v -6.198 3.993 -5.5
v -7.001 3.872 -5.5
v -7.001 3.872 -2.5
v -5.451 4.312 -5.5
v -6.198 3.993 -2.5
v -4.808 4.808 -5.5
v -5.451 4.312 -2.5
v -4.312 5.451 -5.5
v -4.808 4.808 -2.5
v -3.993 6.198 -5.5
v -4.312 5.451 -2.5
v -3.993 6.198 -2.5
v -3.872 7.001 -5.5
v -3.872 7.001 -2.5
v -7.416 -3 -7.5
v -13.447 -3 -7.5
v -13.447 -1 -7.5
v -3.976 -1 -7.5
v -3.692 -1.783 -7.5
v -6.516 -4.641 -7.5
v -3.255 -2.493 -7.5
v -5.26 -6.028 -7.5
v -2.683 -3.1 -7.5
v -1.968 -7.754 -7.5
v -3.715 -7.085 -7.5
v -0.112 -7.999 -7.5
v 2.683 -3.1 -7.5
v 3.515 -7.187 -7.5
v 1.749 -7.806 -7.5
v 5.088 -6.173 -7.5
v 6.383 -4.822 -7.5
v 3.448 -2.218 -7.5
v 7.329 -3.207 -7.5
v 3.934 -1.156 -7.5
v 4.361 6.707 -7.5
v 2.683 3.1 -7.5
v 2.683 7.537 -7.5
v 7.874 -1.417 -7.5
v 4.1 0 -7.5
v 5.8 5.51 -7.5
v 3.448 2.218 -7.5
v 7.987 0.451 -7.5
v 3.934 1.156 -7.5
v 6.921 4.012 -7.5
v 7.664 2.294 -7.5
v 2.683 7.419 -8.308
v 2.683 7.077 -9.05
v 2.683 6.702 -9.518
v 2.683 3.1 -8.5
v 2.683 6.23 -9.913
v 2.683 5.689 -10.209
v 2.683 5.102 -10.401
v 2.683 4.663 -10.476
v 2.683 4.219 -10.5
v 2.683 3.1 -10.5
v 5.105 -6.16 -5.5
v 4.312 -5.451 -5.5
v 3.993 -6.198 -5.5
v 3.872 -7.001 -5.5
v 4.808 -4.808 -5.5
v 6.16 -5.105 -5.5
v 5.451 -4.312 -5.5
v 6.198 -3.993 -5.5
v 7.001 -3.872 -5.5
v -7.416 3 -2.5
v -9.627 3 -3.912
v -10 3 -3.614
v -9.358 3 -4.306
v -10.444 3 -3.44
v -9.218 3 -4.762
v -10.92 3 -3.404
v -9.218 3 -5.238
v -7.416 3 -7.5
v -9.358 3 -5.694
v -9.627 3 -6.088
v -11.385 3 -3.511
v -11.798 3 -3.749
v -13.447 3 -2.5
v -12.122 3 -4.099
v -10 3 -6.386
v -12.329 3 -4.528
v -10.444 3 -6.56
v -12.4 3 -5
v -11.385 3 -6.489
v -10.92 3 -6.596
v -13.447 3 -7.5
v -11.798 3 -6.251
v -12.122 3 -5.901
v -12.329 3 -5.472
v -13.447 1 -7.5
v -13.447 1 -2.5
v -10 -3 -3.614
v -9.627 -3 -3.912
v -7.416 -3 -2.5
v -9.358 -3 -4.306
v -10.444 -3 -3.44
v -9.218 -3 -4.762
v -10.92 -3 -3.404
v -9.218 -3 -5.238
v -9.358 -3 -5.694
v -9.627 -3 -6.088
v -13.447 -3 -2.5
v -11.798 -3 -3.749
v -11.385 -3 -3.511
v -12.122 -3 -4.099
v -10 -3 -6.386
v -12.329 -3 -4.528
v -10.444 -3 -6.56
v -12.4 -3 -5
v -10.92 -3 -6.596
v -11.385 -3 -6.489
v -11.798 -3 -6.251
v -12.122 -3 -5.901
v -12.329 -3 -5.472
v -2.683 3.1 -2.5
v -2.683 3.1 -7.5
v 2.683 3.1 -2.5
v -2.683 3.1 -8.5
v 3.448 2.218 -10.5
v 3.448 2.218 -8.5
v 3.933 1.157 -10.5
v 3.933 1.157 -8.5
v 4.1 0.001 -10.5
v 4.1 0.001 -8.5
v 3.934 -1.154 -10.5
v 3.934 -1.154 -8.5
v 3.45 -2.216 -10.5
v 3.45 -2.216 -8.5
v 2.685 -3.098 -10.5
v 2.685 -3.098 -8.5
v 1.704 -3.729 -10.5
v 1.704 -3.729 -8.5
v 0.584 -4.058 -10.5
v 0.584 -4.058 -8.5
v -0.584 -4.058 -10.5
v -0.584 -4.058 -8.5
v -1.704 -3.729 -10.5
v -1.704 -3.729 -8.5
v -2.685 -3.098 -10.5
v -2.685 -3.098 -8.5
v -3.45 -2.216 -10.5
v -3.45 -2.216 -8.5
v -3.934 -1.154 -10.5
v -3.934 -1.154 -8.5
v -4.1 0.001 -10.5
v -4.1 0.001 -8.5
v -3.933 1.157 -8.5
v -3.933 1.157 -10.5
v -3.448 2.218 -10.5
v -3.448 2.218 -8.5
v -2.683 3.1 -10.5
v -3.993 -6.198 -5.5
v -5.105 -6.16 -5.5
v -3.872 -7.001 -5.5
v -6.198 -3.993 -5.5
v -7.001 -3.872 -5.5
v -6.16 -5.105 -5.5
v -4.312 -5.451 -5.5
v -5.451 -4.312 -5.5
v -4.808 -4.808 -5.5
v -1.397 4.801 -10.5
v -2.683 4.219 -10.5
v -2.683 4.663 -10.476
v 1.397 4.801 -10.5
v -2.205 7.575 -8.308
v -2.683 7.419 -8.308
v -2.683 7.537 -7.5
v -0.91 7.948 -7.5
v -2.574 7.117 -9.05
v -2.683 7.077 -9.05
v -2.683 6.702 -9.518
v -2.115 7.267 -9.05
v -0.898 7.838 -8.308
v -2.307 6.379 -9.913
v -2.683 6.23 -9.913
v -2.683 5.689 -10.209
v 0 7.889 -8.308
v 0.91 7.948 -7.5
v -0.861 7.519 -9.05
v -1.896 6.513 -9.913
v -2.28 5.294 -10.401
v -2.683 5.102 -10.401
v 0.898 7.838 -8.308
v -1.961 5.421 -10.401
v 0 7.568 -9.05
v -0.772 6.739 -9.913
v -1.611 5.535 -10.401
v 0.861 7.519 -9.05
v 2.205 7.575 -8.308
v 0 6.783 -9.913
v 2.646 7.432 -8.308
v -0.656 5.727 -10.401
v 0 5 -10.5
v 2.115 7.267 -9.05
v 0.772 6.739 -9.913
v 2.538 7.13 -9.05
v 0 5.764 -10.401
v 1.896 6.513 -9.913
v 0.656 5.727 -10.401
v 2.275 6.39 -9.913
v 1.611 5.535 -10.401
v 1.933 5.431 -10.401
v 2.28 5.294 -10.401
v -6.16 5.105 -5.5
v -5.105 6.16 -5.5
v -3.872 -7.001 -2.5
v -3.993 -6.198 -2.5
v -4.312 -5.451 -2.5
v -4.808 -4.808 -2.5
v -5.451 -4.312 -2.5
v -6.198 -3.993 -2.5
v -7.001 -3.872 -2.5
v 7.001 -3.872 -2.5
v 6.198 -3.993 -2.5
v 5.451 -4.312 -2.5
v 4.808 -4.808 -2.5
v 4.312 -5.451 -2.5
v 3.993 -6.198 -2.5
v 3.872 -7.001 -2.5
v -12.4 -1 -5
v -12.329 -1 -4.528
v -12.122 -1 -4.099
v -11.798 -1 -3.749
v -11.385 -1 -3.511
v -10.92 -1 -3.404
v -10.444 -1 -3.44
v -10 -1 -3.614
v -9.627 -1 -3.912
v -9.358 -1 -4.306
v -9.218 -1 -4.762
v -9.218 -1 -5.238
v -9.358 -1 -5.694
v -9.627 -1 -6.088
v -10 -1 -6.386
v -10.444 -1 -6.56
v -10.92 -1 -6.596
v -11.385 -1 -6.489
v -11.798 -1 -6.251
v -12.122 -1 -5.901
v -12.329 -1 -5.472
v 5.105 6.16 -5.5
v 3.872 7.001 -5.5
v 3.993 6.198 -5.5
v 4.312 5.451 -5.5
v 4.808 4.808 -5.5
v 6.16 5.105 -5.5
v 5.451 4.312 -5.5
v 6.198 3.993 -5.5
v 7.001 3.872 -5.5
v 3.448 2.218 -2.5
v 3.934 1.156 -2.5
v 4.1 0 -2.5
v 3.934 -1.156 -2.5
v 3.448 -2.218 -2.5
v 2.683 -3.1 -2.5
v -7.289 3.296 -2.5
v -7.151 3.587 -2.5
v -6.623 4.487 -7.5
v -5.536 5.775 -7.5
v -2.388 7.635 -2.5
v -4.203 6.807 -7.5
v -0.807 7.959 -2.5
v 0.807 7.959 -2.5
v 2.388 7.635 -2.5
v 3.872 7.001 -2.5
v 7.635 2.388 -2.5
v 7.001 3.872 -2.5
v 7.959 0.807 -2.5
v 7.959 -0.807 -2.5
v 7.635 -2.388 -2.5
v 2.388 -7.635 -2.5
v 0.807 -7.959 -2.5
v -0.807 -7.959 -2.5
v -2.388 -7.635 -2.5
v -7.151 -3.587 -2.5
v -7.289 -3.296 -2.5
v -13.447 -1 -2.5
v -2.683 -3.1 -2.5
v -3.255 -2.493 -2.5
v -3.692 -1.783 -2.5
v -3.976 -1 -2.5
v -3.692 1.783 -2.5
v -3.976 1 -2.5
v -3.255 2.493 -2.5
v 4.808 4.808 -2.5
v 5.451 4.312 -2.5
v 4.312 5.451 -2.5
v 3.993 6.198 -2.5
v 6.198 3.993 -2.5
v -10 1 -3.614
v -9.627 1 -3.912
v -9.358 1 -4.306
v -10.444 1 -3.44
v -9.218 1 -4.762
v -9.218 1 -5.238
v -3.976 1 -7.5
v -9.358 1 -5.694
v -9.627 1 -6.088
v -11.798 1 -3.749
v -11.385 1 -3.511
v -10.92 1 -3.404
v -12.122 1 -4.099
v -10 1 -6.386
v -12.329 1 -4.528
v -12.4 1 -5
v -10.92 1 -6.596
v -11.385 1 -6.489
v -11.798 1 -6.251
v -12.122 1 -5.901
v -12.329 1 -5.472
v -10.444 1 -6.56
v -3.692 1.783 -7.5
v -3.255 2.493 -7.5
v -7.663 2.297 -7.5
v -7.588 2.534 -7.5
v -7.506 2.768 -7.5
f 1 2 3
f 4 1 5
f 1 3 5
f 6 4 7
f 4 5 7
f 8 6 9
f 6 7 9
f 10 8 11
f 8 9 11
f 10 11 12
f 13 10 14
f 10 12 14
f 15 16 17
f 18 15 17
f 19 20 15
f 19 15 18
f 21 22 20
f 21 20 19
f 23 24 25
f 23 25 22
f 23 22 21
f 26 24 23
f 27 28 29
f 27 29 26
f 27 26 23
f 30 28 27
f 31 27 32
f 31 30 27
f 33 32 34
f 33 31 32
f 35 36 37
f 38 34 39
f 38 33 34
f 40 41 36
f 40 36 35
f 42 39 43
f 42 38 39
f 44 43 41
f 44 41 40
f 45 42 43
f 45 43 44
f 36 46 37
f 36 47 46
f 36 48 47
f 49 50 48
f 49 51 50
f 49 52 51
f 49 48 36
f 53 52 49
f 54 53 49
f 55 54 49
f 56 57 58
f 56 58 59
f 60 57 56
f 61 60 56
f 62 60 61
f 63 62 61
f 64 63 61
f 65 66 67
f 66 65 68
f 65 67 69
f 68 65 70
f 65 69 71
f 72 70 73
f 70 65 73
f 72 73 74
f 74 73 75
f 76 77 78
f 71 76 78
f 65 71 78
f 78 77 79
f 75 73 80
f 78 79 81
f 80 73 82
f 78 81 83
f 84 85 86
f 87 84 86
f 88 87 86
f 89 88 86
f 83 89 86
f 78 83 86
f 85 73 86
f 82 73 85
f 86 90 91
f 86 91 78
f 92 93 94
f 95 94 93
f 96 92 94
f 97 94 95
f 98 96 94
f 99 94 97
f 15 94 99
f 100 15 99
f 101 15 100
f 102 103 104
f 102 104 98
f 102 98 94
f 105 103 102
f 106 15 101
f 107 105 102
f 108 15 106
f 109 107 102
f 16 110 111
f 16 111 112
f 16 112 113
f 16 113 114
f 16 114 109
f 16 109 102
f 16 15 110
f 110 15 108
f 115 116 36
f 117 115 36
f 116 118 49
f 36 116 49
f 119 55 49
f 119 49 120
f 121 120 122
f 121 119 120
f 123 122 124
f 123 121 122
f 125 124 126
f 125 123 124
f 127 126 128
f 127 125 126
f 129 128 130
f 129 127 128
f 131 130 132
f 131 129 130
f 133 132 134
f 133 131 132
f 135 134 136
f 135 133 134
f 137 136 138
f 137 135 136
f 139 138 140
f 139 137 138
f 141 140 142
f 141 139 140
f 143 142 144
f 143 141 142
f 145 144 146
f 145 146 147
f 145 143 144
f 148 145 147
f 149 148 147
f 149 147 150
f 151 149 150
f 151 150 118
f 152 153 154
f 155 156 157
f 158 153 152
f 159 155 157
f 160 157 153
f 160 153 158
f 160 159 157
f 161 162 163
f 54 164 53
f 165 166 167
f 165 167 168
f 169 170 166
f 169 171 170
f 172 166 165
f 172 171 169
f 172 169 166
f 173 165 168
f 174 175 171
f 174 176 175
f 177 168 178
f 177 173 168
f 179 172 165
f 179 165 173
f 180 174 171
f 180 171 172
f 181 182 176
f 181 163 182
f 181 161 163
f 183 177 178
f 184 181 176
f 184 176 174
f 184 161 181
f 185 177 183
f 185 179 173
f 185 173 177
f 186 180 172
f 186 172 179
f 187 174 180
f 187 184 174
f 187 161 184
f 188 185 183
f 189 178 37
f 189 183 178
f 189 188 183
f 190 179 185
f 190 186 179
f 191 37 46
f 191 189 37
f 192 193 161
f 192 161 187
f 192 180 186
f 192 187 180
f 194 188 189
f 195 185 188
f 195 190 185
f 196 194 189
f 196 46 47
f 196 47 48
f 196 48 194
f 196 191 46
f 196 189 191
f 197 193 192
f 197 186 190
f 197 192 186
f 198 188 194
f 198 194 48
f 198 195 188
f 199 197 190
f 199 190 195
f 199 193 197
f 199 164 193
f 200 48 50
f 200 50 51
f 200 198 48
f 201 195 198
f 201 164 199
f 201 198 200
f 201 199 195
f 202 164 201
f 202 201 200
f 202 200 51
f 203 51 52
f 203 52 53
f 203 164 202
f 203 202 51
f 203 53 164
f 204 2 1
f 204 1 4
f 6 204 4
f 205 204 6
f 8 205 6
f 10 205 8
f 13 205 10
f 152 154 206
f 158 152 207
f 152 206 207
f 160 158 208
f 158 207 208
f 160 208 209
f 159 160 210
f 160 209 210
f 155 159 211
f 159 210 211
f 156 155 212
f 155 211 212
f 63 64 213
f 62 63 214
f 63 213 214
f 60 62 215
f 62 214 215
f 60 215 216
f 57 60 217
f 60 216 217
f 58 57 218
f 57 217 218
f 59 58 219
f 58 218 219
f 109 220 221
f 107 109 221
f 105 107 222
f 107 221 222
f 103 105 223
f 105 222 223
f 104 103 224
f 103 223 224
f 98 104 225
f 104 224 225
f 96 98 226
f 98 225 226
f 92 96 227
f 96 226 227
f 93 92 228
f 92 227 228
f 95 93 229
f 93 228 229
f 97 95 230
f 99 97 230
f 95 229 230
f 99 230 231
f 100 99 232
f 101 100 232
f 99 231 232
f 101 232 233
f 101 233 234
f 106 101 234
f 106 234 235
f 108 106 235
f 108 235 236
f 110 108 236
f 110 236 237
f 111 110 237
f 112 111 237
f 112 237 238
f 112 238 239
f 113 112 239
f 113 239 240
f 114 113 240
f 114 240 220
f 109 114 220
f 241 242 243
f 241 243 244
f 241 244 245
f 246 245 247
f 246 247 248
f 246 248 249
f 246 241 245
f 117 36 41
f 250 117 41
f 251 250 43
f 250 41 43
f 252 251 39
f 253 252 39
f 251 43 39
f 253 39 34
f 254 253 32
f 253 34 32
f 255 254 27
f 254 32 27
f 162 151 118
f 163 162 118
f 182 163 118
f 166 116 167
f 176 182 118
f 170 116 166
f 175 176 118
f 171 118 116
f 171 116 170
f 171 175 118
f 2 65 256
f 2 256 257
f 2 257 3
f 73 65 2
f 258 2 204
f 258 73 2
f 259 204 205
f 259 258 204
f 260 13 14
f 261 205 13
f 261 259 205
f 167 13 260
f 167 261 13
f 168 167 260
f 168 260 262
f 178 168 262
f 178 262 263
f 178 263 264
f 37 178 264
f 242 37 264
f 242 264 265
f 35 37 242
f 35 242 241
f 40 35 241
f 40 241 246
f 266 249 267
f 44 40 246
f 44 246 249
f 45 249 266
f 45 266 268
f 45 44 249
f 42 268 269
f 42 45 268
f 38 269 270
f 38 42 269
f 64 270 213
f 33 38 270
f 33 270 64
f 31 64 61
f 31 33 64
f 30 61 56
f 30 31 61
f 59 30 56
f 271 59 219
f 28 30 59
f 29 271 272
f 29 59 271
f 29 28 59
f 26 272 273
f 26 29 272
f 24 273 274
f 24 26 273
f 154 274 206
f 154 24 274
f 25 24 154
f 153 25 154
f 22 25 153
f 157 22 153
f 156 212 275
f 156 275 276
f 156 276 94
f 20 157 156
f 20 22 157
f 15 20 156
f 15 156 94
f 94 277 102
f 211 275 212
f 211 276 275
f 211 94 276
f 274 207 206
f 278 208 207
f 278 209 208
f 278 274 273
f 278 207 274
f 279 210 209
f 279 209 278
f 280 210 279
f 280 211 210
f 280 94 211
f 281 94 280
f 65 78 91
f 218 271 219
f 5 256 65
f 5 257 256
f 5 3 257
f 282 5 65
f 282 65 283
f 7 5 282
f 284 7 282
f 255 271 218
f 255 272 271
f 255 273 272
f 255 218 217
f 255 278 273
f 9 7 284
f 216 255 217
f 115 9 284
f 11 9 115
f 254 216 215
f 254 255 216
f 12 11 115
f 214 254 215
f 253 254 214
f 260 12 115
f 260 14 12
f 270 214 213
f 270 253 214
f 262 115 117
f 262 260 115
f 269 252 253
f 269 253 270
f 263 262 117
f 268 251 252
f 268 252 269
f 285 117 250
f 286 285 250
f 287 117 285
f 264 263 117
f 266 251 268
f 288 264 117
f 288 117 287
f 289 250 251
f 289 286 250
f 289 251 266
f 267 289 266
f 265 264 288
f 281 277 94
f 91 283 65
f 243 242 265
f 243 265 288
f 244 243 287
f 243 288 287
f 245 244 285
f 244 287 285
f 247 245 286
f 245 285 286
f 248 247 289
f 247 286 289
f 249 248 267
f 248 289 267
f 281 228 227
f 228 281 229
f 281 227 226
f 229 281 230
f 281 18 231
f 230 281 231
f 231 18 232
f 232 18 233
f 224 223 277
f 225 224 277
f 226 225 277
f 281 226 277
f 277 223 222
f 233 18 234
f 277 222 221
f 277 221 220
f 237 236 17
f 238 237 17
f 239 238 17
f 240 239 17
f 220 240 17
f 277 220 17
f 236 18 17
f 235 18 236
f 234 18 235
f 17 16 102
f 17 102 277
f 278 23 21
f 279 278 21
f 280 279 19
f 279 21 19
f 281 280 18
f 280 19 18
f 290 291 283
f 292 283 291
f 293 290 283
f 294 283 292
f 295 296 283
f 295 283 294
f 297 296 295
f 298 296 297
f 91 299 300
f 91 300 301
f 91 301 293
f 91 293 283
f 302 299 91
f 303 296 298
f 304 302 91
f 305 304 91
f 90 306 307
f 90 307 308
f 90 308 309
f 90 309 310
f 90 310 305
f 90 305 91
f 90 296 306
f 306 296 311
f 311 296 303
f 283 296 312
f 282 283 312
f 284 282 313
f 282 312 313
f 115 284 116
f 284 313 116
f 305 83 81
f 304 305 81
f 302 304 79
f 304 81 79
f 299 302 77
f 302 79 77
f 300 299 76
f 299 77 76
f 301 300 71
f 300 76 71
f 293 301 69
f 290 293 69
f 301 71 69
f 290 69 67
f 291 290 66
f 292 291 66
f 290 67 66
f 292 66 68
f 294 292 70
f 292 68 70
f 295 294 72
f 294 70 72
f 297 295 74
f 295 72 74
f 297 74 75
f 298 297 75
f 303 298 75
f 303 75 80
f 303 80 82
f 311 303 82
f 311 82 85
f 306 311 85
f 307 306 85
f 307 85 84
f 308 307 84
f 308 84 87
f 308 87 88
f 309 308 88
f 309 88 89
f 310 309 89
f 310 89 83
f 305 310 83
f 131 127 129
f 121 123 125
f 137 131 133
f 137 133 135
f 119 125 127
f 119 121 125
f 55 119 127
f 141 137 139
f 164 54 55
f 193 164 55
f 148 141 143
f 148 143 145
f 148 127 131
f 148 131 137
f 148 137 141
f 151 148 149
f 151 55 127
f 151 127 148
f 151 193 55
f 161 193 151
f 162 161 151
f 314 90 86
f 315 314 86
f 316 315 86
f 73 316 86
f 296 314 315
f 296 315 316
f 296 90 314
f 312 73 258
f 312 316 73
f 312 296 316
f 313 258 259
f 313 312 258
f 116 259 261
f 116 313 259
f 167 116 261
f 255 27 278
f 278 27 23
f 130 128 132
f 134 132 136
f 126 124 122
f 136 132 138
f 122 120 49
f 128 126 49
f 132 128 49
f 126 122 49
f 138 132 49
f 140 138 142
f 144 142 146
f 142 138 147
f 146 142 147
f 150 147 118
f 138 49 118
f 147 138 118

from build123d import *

# Parameters (mm, degrees)
SKETCH_1_R          = 14
SKETCH_1_R_2        = 1.5
EXTRUDE_1_DEPTH     = 2
CUT_EXTRUDE_1_DEPTH = 20.899748742
EXTRUDE_4_DEPTH     = 2.5
EXTRUDE_START       = 5
SKETCH_6_R          = 8
EXTRUDE_5_DEPTH     = 5
EXTRUDE_START_2     = 1
EXTRUDE_6_DEPTH     = 1
SKETCH_8_W          = 8
SKETCH_8_H          = 2
EXTRUDE_7_DEPTH     = 5
SKETCH_9_R          = 1.6
CUT_EXTRUDE_3_DEPTH = 24.606143268
EXTRUDE_START_3     = 2
EXTRUDE_8_DEPTH     = 2
SKETCH_11_W         = 12.041493288
SKETCH_11_H         = 2
CUT_EXTRUDE_4_DEPTH = 5
FILLET_2_R          = 3
CUT_EXTRUDE_START   = -4.5
SKETCH_12_R         = 14
CUT_EXTRUDE_5_DEPTH = 4.5
SKETCH_13_R         = 3.2
CUT_EXTRUDE_6_DEPTH = 3


with BuildPart() as part:
    # 草图1 → 凸台-拉伸1 (new body)
    with BuildSketch(Plane.XY):
        Circle(SKETCH_1_R)
        with Locations((-7.071067812, 7.071067812)):
            Circle(SKETCH_1_R_2, mode=Mode.SUBTRACT)
        with Locations((7.071067812, 7.071067812)):
            Circle(SKETCH_1_R_2, mode=Mode.SUBTRACT)
        with Locations((-7.071067812, -7.071067812)):
            Circle(SKETCH_1_R_2, mode=Mode.SUBTRACT)
        with Locations((7.071067812, -7.071067812)):
            Circle(SKETCH_1_R_2, mode=Mode.SUBTRACT)
    extrude(amount=EXTRUDE_1_DEPTH)

    # 草图2 → 切除-拉伸1 (cut, through all)
    with BuildSketch(Plane(origin=(0, 0, 0), x_dir=(-1, 0, 0), z_dir=(0, 0, -1))):
        with BuildLine():
            ThreePointArc((-2.683281573, 3.1), (-4.1, 0), (-2.683281573, -3.1))
            Line((-2.683281573, -3.1), (2.683281573, -3.1))
            ThreePointArc((2.683281573, -3.1), (4.1, 0), (2.683281573, 3.1))
            Line((2.683281573, 3.1), (-2.683281573, 3.1))
        make_face()
    extrude(amount=-CUT_EXTRUDE_1_DEPTH, mode=Mode.SUBTRACT)

    # 草图3 → 凸台-拉伸4 (add)
    with BuildSketch(Plane(origin=(0, 0, 0), x_dir=(-1, 0, 0), z_dir=(0, 0, -1))):
        Polygon((0, 3.1), (3.7, 3.1), (3.7, 7.1), (-3.7, 7.1), (-3.7, 3.1), align=None)
    extrude(amount=EXTRUDE_4_DEPTH)

    # 草图6 → 凸台-拉伸5 (add)
    with BuildSketch(Plane(origin=(0, 0, -2.5), x_dir=(-1, 0, 0), z_dir=(0, 0, -1)).offset(EXTRUDE_START)):
        Circle(SKETCH_6_R)
        with BuildLine():
            Line((-2.683281573, -3.1), (2.683281573, -3.1))
            ThreePointArc((2.683281573, -3.1), (4.1, 0), (2.683281573, 3.1))
            Line((2.683281573, 3.1), (-2.683281573, 3.1))
            ThreePointArc((-2.683281573, 3.1), (-4.1, 0), (-2.683281573, -3.1))
        make_face(mode=Mode.SUBTRACT)
    extrude(amount=-EXTRUDE_5_DEPTH)

    # 草图7 → 凸台-拉伸6 (add)
    with BuildSketch(Plane(origin=(0, 0, -7.5), x_dir=(-1, 0, 0), z_dir=(0, 0, -1)).offset(EXTRUDE_START_2)):
        with BuildLine():
            Line((-2.683281573, 3.1), (-2.683281573, 7.536577473))
            ThreePointArc((-2.683281573, 7.536577473), (0, 8), (2.683281573, 7.536577473))
            Line((2.683281573, 7.536577473), (2.683281573, 3.1))
            Line((2.683281573, 3.1), (-2.683281573, 3.1))
        make_face()
    extrude(amount=-EXTRUDE_6_DEPTH)

    # 草图8 → 凸台-拉伸7 (add)
    with BuildSketch(Plane(origin=(0, 0, -7.5), x_dir=(-1, 0, 0), z_dir=(0, 0, -1))):
        with Locations((9.447401339, 2)):
            Rectangle(SKETCH_8_W, SKETCH_8_H)
        with Locations((9.447401339, -2)):
            Rectangle(SKETCH_8_W, SKETCH_8_H)
    extrude(amount=-EXTRUDE_7_DEPTH)

    # 草图9 → 切除-拉伸3 (cut, through all)
    with BuildSketch(Plane(origin=(0, 3, 0), x_dir=(1, 0, 0), z_dir=(0, 1, 0))):
        with Locations((-10.8, 5)):
            Circle(SKETCH_9_R)
    extrude(amount=-CUT_EXTRUDE_3_DEPTH, mode=Mode.SUBTRACT)

    # 草图10 → 凸台-拉伸8 (add)
    with BuildSketch(Plane(origin=(0, 0, -8.5), x_dir=(-1, 0, 0), z_dir=(0, 0, -1)).offset(EXTRUDE_START_3)):
        with BuildLine():
            Line((-2.683281573, 7.536577473), (-2.683281573, 3.1))
            ThreePointArc((-2.683281573, 3.1), (0, -4.1), (2.683281573, 3.1))
            Line((2.683281573, 3.1), (2.683281573, 7.536577473))
            ThreePointArc((2.683281573, 7.536577473), (0, 8), (-2.683281573, 7.536577473))
        make_face()
    extrude(amount=-EXTRUDE_8_DEPTH)

    # 草图11 → 切除-拉伸4 (cut)
    with BuildSketch(Plane(origin=(0, 0, -7.5), x_dir=(-1, 0, 0), z_dir=(0, 0, -1))):
        with Locations((7.426654695, 0)):
            Rectangle(SKETCH_11_W, SKETCH_11_H)
    extrude(amount=-CUT_EXTRUDE_4_DEPTH, mode=Mode.SUBTRACT)

    # 圆角2
    fillet_2_edges = [part.edges().sort_by_distance(p)[0] for p in [
        (0, 8, -10.5),
    ]]
    fillet(fillet_2_edges, radius=FILLET_2_R)

    # 草图12 → 切除-拉伸5 (cut)
    with BuildSketch(Plane.XY.offset(2).offset(CUT_EXTRUDE_START)):
        Circle(SKETCH_12_R)
    extrude(amount=CUT_EXTRUDE_5_DEPTH, mode=Mode.SUBTRACT)

    # 草图13 → 切除-拉伸6 (cut)
    with BuildSketch(Plane.XY.offset(-2.5)):
        with Locations((-7.071067812, 7.071067812)):
            Circle(SKETCH_13_R)
        with Locations((7.071067812, 7.071067812)):
            Circle(SKETCH_13_R)
        with Locations((-7.071067812, -7.071067812)):
            Circle(SKETCH_13_R)
        with Locations((7.071067812, -7.071067812)):
            Circle(SKETCH_13_R)
    extrude(amount=-CUT_EXTRUDE_6_DEPTH, mode=Mode.SUBTRACT)


solid = part.part
